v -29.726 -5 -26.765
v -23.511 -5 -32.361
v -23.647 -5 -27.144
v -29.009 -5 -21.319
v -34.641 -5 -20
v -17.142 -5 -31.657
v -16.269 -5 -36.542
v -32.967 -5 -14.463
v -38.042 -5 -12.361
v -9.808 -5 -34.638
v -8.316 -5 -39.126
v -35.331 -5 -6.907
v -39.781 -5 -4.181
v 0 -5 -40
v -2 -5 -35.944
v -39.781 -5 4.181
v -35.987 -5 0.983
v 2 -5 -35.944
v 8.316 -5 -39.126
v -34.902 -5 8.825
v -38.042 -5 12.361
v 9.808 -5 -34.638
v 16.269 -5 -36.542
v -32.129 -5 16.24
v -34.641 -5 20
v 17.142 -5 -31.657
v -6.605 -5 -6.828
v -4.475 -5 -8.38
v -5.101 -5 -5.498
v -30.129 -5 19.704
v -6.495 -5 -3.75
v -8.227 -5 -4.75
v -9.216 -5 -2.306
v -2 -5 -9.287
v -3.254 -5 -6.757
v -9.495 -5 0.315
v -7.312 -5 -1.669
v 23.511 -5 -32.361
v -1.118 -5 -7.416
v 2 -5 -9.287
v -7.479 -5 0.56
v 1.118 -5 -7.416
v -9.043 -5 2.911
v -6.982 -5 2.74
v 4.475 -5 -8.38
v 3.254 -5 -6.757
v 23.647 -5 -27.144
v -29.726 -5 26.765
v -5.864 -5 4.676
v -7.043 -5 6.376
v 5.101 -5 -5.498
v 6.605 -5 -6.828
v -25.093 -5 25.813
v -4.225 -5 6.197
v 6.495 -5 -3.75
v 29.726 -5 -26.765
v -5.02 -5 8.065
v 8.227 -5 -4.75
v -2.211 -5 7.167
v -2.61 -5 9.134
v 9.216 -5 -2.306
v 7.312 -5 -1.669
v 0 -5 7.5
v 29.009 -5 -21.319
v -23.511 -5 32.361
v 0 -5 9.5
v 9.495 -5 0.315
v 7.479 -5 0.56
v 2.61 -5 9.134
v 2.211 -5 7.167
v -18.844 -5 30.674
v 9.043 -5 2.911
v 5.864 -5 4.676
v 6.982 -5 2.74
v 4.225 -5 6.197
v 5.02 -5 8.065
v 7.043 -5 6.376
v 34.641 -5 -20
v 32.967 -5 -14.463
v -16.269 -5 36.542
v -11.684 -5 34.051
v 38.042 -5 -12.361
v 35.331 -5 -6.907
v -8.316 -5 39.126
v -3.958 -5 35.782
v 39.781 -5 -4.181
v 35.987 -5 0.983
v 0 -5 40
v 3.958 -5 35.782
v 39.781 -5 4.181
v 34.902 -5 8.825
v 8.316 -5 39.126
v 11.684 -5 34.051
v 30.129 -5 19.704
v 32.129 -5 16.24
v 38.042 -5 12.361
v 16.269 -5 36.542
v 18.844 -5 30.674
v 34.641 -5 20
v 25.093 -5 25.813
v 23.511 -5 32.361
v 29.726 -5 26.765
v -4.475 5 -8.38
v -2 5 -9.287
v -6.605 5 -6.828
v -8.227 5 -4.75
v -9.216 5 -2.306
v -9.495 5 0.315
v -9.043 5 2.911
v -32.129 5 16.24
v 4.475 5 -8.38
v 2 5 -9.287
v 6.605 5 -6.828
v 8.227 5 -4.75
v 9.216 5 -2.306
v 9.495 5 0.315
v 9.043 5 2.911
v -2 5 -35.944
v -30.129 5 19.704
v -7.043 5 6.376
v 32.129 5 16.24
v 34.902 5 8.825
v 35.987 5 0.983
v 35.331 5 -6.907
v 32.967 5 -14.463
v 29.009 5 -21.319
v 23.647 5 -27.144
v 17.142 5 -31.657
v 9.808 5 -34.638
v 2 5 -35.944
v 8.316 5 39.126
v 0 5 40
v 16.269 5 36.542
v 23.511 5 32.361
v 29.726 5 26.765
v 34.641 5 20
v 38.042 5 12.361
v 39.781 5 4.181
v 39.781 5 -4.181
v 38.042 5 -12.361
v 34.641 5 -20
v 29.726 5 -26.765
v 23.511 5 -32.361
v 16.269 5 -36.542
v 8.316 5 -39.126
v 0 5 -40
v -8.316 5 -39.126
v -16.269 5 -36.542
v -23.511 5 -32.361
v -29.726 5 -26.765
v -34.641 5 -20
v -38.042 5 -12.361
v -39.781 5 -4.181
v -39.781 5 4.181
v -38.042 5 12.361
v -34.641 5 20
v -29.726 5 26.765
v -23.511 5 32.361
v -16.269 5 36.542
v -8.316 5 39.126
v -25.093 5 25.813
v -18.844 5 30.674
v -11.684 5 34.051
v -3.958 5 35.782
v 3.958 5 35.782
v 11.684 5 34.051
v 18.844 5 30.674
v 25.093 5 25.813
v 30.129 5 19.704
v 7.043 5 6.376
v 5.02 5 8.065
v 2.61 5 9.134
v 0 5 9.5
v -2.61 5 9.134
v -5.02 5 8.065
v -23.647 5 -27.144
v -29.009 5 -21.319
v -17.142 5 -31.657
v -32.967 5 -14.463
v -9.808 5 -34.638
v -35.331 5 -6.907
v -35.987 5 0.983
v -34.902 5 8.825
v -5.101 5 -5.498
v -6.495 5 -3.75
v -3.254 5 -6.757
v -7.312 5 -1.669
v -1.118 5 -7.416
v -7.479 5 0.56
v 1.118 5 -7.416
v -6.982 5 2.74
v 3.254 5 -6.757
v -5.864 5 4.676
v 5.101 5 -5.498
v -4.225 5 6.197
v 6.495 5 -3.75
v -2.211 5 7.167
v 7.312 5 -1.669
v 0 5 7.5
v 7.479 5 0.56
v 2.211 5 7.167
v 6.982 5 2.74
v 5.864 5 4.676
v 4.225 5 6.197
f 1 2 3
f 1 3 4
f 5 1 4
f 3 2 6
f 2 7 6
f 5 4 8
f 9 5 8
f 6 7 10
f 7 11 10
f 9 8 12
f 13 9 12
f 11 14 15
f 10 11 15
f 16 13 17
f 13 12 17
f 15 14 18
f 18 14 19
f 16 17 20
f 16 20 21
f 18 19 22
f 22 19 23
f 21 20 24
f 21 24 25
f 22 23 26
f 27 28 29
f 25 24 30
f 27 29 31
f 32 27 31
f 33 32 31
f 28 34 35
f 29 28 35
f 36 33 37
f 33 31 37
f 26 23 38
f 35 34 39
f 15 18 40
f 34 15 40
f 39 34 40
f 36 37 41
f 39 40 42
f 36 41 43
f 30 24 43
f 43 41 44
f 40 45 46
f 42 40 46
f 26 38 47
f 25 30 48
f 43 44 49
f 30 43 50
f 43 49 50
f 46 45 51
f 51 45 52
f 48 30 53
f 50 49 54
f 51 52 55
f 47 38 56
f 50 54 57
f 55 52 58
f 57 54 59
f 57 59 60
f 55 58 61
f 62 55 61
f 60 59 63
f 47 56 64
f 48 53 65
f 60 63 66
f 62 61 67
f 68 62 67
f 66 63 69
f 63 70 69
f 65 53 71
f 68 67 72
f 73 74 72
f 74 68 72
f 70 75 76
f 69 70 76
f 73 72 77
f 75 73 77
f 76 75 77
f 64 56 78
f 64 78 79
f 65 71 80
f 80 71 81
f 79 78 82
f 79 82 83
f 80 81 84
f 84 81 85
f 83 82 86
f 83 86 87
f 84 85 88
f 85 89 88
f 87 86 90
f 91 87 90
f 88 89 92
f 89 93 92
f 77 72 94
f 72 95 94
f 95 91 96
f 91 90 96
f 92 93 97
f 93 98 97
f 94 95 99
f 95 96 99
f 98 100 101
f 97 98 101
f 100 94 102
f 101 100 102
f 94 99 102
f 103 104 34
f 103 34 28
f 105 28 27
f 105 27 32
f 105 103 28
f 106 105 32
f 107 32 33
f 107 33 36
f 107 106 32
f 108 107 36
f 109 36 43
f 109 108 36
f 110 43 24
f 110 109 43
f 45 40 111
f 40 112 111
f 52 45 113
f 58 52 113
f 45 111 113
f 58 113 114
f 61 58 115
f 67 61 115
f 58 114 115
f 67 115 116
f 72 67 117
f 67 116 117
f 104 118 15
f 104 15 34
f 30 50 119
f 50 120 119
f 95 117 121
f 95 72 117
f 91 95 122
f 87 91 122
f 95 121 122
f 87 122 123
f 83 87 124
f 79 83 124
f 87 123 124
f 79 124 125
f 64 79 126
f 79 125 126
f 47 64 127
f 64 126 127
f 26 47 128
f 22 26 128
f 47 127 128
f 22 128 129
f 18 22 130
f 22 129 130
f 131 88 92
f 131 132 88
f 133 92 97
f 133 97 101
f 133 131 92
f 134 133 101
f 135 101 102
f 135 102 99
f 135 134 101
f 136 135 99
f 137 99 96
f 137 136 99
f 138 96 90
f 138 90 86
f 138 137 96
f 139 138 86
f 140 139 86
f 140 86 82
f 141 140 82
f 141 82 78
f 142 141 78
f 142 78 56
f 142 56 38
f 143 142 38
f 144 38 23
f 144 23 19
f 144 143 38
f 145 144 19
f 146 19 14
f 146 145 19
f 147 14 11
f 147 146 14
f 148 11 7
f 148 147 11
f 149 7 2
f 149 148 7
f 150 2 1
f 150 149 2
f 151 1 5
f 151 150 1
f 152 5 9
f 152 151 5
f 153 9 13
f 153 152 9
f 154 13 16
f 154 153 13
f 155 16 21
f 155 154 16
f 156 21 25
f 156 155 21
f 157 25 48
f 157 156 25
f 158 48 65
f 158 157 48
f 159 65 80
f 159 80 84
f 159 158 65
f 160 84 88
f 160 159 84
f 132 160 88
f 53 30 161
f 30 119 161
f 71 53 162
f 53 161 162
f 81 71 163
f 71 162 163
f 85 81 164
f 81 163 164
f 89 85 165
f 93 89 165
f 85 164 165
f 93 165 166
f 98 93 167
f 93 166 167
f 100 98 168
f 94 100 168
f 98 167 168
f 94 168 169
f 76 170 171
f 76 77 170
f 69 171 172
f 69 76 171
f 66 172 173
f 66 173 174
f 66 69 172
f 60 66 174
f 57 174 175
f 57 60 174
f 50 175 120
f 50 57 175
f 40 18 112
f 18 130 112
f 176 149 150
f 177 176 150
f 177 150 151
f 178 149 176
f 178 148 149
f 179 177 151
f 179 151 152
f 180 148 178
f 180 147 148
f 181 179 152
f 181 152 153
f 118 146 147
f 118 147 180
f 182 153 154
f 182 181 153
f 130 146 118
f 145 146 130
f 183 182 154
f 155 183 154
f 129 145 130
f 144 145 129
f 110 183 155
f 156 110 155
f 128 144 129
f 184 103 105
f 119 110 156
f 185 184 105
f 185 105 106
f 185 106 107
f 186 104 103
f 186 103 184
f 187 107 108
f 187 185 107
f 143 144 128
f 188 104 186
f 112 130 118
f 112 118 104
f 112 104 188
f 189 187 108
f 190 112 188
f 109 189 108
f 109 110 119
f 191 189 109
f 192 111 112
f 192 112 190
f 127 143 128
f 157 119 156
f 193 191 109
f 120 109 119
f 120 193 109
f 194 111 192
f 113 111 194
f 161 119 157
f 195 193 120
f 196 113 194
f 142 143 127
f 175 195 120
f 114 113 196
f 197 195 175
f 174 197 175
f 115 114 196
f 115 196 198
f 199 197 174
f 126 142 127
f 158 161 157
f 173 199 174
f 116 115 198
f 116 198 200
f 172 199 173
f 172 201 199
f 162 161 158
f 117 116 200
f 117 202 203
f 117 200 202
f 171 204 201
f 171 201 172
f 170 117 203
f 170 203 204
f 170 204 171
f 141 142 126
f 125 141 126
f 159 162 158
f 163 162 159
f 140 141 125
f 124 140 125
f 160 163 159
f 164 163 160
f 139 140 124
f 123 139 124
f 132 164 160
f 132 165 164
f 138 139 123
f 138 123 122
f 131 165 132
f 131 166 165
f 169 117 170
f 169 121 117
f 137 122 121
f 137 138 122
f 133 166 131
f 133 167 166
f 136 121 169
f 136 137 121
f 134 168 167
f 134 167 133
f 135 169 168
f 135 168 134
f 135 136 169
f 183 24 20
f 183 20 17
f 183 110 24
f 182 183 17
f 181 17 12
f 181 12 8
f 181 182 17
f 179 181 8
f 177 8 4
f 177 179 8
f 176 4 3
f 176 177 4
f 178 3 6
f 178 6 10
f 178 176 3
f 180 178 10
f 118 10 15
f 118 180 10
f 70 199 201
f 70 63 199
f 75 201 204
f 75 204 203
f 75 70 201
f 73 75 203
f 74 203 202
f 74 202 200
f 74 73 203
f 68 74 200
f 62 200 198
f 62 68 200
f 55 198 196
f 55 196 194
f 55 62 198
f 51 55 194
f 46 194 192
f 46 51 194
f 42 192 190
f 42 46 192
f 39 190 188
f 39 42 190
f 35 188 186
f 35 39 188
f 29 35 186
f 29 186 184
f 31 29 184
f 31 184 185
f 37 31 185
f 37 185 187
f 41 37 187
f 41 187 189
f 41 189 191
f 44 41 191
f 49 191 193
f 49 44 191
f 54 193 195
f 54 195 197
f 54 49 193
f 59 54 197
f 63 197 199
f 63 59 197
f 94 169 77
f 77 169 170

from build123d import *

# Parameters (mm, degrees)
SKETCH2_R           = 40
SKETCH2_R_2         = 7.5
BOSS_EXTRUDE1_DEPTH = 5


with BuildPart() as part:
    # Sketch2 → Boss-Extrude1 (new, symmetric)
    with BuildSketch(Plane(origin=(0, 0, 0), x_dir=(1, 0, 0), z_dir=(0, 1, 0))):
        with Locations(Location((0, 0, 0), (0, 0, 270))):
            Circle(SKETCH2_R)
        with Locations(Location((0, 0, 0), (0, 0, 270))):
            Circle(SKETCH2_R_2, mode=Mode.SUBTRACT)
        with BuildLine():
            Line((-2, 35.944401511), (-2, 9.287087811))
            ThreePointArc((-2, 9.287087811), (-8.227241336, 4.75), (-9.042853971, -2.911493098))
            Line((-9.042853971, -2.911493098), (-32.128764833, -16.240149948))
            ThreePointArc((-32.128764833, -16.240149948), (-31.176914536, 18), (-2, 35.944401511))
        make_face(mode=Mode.SUBTRACT)
        with BuildLine():
            Line((2, 35.944401511), (2, 9.287087811))
            ThreePointArc((2, 9.287087811), (8.227241336, 4.75), (9.042853971, -2.911493098))
            Line((9.042853971, -2.911493098), (32.128764833, -16.240149948))
            ThreePointArc((32.128764833, -16.240149948), (31.176914536, 18), (2, 35.944401511))
        make_face(mode=Mode.SUBTRACT)
        with BuildLine():
            Line((-7.042853971, -6.375594713), (-30.128764833, -19.704251563))
            ThreePointArc((-30.128764833, -19.704251563), (0, -36), (30.128764833, -19.704251563))
            Line((30.128764833, -19.704251563), (7.042853971, -6.375594713))
            ThreePointArc((7.042853971, -6.375594713), (0, -9.5), (-7.042853971, -6.375594713))
        make_face(mode=Mode.SUBTRACT)
    extrude(amount=BOSS_EXTRUDE1_DEPTH, both=True)


solid = part.part
